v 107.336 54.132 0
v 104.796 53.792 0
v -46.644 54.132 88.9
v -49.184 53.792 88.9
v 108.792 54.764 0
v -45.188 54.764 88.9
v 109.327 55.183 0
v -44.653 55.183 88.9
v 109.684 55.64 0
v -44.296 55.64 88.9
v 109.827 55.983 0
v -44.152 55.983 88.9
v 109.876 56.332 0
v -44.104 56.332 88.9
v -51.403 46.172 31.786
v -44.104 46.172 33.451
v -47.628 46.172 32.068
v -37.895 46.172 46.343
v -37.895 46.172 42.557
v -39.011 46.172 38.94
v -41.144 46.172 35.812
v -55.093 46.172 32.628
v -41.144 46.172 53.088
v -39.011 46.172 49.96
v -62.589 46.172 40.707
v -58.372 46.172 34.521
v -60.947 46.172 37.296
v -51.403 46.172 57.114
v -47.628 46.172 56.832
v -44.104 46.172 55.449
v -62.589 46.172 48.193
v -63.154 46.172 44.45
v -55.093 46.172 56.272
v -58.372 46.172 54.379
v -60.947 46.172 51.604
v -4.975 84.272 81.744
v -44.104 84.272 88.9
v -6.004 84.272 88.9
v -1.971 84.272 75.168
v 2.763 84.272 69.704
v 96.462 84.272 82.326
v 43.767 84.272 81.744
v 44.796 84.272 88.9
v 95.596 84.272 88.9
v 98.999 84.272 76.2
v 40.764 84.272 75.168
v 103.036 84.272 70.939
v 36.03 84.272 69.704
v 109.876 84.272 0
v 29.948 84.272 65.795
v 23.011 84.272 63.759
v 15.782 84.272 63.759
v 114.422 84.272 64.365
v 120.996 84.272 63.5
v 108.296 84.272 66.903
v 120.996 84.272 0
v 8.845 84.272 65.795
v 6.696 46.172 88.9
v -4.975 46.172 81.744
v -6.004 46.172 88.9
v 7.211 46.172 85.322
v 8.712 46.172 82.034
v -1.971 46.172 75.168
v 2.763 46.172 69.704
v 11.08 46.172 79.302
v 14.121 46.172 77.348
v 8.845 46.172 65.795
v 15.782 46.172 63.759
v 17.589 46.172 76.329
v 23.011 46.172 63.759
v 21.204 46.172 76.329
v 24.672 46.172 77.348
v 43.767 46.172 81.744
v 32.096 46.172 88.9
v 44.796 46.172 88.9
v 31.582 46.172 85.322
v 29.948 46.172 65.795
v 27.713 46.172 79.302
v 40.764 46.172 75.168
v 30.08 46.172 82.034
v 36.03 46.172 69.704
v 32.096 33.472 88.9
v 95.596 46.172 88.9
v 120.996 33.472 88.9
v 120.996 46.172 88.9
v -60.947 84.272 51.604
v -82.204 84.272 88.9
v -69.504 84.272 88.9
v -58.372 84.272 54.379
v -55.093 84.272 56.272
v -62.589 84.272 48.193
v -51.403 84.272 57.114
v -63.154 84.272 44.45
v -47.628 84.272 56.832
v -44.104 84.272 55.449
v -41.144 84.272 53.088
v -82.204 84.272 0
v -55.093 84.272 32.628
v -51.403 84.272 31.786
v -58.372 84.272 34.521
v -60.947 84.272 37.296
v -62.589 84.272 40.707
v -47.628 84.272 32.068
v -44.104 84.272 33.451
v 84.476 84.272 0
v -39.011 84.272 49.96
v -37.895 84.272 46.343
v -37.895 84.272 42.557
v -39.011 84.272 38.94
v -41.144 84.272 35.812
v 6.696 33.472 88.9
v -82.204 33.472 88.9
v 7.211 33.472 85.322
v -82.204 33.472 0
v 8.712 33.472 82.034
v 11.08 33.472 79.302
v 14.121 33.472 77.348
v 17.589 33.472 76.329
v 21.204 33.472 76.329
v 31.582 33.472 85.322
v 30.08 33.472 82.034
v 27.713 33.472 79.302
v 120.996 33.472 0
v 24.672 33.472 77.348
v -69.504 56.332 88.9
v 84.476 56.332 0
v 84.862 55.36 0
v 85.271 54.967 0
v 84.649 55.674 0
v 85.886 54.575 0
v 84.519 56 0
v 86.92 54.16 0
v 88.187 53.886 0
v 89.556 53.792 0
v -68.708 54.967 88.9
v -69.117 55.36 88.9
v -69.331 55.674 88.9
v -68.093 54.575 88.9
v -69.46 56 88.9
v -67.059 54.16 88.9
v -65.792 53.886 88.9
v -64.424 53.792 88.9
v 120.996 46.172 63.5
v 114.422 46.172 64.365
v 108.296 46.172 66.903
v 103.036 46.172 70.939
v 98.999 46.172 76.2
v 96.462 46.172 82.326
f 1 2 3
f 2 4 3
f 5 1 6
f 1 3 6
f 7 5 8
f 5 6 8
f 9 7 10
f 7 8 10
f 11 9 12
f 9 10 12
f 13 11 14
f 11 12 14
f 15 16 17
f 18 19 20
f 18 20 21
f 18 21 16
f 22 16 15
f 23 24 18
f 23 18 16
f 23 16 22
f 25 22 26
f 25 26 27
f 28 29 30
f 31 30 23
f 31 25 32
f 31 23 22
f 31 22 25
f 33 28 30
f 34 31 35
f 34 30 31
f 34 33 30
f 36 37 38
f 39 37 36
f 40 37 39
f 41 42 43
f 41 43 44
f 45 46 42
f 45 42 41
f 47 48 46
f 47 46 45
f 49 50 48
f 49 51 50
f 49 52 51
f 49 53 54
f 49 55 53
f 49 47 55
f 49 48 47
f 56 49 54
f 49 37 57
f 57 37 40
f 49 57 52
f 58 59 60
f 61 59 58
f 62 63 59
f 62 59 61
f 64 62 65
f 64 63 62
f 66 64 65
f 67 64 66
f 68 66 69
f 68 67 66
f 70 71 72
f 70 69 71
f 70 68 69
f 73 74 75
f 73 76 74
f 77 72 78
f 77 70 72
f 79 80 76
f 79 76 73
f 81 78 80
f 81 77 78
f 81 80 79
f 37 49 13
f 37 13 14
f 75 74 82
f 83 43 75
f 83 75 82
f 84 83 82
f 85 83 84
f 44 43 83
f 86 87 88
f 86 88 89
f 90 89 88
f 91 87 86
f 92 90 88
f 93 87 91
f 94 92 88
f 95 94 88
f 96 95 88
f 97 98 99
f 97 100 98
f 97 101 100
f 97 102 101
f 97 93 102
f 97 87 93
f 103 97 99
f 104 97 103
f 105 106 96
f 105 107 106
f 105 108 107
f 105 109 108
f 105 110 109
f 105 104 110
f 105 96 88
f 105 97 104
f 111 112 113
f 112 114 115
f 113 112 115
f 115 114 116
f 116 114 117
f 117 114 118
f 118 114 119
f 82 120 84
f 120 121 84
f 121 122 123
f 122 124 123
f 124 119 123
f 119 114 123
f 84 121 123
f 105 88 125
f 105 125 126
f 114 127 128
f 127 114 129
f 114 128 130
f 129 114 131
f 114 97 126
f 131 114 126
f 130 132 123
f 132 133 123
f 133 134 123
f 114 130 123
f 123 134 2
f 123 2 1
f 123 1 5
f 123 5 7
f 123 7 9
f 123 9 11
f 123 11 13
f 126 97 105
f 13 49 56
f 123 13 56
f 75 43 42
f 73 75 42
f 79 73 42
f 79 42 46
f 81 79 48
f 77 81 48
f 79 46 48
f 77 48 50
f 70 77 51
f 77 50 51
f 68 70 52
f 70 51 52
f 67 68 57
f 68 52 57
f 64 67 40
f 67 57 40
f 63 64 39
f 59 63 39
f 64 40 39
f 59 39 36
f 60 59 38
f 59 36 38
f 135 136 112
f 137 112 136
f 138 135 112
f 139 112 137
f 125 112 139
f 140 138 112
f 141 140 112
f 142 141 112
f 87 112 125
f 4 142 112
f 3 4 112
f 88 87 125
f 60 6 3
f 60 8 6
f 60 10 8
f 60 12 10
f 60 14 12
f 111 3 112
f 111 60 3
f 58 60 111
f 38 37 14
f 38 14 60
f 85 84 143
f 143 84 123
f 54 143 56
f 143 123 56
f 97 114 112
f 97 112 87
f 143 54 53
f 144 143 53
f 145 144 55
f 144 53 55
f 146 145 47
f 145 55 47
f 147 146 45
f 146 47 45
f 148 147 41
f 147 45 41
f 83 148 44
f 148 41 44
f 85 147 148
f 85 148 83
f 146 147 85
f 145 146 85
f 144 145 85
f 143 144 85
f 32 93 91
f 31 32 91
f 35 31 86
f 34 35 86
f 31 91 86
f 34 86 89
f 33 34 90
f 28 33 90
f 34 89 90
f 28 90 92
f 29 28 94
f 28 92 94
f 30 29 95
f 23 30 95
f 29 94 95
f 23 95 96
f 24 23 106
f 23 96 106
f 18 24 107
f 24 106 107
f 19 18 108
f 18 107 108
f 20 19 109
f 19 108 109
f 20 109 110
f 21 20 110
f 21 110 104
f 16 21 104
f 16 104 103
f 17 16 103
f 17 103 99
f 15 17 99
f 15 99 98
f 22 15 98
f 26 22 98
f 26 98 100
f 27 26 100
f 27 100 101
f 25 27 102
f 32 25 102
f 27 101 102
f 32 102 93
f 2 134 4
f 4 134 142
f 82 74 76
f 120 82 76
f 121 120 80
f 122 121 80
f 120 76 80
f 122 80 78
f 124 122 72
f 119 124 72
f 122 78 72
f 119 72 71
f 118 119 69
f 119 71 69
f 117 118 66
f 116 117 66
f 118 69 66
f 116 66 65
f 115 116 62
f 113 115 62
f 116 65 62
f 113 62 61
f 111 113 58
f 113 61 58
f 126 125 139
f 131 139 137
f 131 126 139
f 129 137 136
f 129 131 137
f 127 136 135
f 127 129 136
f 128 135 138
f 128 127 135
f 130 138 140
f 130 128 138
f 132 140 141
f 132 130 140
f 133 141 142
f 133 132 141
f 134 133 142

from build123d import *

# Parameters (mm, degrees)
SKETCH1_W           = 203.2
SKETCH1_H           = 50.8
BOSS_EXTRUDE1_DEPTH = 88.9
SKETCH2_R           = 12.7
SKETCH2_R_2         = 25.4
CUT_EXTRUDE1_DEPTH  = 38.1
SKETCH3_R           = 12.7
CUT_EXTRUDE2_DEPTH  = 155.90300195
CUT_EXTRUDE3_DEPTH  = 30.48
FILLET1_R           = 2.54


with BuildPart() as part:
    # Sketch1 → Boss-Extrude1 (new body)
    with BuildSketch(Plane.XY):
        with Locations((19.396363636, 58.871863724)):
            Rectangle(SKETCH1_W, SKETCH1_H)
    extrude(amount=BOSS_EXTRUDE1_DEPTH)

    # Sketch2 → Cut-Extrude1 (cut)
    with BuildSketch(Plane(origin=(0, 84.271863724, 0), x_dir=(1, 0, 0), z_dir=(0, 1, 0))):
        with Locations(Location((-50.453636364, -44.45, 0), (0, 0, 180))):
            Circle(SKETCH2_R)
        with Locations((19.396363636, -88.9)):
            Circle(SKETCH2_R_2)
        with Locations((120.996363636, -88.9)):
            Circle(SKETCH2_R_2)
    extrude(amount=-CUT_EXTRUDE1_DEPTH, mode=Mode.SUBTRACT)

    # Sketch3 → Cut-Extrude2 (cut, through all)
    with BuildSketch(Plane(origin=(0, 46.171863724, 0), x_dir=(1, 0, 0), z_dir=(0, 1, 0))):
        with Locations((19.396363636, -88.9)):
            Circle(SKETCH3_R)
    extrude(amount=-CUT_EXTRUDE2_DEPTH, mode=Mode.SUBTRACT)

    # Sketch4 → Cut-Extrude3 (cut)
    with BuildSketch(Plane(origin=(0, 84.271863724, 0), x_dir=(1, 0, 0), z_dir=(0, 1, 0))):
        Polygon((-69.503636364, -88.9), (84.475680429, 0), (109.875680429, 0), (-44.103636364, -88.9), align=None)
    extrude(amount=-CUT_EXTRUDE3_DEPTH, mode=Mode.SUBTRACT)

    # Fillet1
    fillet1_edges = [part.edges().sort_by_distance(p)[0] for p in [
        (7.486022033, 53.791863724, 44.45),
        (32.886022033, 53.791863724, 44.45),
    ]]
    fillet(fillet1_edges, radius=FILLET1_R)


solid = part.part
